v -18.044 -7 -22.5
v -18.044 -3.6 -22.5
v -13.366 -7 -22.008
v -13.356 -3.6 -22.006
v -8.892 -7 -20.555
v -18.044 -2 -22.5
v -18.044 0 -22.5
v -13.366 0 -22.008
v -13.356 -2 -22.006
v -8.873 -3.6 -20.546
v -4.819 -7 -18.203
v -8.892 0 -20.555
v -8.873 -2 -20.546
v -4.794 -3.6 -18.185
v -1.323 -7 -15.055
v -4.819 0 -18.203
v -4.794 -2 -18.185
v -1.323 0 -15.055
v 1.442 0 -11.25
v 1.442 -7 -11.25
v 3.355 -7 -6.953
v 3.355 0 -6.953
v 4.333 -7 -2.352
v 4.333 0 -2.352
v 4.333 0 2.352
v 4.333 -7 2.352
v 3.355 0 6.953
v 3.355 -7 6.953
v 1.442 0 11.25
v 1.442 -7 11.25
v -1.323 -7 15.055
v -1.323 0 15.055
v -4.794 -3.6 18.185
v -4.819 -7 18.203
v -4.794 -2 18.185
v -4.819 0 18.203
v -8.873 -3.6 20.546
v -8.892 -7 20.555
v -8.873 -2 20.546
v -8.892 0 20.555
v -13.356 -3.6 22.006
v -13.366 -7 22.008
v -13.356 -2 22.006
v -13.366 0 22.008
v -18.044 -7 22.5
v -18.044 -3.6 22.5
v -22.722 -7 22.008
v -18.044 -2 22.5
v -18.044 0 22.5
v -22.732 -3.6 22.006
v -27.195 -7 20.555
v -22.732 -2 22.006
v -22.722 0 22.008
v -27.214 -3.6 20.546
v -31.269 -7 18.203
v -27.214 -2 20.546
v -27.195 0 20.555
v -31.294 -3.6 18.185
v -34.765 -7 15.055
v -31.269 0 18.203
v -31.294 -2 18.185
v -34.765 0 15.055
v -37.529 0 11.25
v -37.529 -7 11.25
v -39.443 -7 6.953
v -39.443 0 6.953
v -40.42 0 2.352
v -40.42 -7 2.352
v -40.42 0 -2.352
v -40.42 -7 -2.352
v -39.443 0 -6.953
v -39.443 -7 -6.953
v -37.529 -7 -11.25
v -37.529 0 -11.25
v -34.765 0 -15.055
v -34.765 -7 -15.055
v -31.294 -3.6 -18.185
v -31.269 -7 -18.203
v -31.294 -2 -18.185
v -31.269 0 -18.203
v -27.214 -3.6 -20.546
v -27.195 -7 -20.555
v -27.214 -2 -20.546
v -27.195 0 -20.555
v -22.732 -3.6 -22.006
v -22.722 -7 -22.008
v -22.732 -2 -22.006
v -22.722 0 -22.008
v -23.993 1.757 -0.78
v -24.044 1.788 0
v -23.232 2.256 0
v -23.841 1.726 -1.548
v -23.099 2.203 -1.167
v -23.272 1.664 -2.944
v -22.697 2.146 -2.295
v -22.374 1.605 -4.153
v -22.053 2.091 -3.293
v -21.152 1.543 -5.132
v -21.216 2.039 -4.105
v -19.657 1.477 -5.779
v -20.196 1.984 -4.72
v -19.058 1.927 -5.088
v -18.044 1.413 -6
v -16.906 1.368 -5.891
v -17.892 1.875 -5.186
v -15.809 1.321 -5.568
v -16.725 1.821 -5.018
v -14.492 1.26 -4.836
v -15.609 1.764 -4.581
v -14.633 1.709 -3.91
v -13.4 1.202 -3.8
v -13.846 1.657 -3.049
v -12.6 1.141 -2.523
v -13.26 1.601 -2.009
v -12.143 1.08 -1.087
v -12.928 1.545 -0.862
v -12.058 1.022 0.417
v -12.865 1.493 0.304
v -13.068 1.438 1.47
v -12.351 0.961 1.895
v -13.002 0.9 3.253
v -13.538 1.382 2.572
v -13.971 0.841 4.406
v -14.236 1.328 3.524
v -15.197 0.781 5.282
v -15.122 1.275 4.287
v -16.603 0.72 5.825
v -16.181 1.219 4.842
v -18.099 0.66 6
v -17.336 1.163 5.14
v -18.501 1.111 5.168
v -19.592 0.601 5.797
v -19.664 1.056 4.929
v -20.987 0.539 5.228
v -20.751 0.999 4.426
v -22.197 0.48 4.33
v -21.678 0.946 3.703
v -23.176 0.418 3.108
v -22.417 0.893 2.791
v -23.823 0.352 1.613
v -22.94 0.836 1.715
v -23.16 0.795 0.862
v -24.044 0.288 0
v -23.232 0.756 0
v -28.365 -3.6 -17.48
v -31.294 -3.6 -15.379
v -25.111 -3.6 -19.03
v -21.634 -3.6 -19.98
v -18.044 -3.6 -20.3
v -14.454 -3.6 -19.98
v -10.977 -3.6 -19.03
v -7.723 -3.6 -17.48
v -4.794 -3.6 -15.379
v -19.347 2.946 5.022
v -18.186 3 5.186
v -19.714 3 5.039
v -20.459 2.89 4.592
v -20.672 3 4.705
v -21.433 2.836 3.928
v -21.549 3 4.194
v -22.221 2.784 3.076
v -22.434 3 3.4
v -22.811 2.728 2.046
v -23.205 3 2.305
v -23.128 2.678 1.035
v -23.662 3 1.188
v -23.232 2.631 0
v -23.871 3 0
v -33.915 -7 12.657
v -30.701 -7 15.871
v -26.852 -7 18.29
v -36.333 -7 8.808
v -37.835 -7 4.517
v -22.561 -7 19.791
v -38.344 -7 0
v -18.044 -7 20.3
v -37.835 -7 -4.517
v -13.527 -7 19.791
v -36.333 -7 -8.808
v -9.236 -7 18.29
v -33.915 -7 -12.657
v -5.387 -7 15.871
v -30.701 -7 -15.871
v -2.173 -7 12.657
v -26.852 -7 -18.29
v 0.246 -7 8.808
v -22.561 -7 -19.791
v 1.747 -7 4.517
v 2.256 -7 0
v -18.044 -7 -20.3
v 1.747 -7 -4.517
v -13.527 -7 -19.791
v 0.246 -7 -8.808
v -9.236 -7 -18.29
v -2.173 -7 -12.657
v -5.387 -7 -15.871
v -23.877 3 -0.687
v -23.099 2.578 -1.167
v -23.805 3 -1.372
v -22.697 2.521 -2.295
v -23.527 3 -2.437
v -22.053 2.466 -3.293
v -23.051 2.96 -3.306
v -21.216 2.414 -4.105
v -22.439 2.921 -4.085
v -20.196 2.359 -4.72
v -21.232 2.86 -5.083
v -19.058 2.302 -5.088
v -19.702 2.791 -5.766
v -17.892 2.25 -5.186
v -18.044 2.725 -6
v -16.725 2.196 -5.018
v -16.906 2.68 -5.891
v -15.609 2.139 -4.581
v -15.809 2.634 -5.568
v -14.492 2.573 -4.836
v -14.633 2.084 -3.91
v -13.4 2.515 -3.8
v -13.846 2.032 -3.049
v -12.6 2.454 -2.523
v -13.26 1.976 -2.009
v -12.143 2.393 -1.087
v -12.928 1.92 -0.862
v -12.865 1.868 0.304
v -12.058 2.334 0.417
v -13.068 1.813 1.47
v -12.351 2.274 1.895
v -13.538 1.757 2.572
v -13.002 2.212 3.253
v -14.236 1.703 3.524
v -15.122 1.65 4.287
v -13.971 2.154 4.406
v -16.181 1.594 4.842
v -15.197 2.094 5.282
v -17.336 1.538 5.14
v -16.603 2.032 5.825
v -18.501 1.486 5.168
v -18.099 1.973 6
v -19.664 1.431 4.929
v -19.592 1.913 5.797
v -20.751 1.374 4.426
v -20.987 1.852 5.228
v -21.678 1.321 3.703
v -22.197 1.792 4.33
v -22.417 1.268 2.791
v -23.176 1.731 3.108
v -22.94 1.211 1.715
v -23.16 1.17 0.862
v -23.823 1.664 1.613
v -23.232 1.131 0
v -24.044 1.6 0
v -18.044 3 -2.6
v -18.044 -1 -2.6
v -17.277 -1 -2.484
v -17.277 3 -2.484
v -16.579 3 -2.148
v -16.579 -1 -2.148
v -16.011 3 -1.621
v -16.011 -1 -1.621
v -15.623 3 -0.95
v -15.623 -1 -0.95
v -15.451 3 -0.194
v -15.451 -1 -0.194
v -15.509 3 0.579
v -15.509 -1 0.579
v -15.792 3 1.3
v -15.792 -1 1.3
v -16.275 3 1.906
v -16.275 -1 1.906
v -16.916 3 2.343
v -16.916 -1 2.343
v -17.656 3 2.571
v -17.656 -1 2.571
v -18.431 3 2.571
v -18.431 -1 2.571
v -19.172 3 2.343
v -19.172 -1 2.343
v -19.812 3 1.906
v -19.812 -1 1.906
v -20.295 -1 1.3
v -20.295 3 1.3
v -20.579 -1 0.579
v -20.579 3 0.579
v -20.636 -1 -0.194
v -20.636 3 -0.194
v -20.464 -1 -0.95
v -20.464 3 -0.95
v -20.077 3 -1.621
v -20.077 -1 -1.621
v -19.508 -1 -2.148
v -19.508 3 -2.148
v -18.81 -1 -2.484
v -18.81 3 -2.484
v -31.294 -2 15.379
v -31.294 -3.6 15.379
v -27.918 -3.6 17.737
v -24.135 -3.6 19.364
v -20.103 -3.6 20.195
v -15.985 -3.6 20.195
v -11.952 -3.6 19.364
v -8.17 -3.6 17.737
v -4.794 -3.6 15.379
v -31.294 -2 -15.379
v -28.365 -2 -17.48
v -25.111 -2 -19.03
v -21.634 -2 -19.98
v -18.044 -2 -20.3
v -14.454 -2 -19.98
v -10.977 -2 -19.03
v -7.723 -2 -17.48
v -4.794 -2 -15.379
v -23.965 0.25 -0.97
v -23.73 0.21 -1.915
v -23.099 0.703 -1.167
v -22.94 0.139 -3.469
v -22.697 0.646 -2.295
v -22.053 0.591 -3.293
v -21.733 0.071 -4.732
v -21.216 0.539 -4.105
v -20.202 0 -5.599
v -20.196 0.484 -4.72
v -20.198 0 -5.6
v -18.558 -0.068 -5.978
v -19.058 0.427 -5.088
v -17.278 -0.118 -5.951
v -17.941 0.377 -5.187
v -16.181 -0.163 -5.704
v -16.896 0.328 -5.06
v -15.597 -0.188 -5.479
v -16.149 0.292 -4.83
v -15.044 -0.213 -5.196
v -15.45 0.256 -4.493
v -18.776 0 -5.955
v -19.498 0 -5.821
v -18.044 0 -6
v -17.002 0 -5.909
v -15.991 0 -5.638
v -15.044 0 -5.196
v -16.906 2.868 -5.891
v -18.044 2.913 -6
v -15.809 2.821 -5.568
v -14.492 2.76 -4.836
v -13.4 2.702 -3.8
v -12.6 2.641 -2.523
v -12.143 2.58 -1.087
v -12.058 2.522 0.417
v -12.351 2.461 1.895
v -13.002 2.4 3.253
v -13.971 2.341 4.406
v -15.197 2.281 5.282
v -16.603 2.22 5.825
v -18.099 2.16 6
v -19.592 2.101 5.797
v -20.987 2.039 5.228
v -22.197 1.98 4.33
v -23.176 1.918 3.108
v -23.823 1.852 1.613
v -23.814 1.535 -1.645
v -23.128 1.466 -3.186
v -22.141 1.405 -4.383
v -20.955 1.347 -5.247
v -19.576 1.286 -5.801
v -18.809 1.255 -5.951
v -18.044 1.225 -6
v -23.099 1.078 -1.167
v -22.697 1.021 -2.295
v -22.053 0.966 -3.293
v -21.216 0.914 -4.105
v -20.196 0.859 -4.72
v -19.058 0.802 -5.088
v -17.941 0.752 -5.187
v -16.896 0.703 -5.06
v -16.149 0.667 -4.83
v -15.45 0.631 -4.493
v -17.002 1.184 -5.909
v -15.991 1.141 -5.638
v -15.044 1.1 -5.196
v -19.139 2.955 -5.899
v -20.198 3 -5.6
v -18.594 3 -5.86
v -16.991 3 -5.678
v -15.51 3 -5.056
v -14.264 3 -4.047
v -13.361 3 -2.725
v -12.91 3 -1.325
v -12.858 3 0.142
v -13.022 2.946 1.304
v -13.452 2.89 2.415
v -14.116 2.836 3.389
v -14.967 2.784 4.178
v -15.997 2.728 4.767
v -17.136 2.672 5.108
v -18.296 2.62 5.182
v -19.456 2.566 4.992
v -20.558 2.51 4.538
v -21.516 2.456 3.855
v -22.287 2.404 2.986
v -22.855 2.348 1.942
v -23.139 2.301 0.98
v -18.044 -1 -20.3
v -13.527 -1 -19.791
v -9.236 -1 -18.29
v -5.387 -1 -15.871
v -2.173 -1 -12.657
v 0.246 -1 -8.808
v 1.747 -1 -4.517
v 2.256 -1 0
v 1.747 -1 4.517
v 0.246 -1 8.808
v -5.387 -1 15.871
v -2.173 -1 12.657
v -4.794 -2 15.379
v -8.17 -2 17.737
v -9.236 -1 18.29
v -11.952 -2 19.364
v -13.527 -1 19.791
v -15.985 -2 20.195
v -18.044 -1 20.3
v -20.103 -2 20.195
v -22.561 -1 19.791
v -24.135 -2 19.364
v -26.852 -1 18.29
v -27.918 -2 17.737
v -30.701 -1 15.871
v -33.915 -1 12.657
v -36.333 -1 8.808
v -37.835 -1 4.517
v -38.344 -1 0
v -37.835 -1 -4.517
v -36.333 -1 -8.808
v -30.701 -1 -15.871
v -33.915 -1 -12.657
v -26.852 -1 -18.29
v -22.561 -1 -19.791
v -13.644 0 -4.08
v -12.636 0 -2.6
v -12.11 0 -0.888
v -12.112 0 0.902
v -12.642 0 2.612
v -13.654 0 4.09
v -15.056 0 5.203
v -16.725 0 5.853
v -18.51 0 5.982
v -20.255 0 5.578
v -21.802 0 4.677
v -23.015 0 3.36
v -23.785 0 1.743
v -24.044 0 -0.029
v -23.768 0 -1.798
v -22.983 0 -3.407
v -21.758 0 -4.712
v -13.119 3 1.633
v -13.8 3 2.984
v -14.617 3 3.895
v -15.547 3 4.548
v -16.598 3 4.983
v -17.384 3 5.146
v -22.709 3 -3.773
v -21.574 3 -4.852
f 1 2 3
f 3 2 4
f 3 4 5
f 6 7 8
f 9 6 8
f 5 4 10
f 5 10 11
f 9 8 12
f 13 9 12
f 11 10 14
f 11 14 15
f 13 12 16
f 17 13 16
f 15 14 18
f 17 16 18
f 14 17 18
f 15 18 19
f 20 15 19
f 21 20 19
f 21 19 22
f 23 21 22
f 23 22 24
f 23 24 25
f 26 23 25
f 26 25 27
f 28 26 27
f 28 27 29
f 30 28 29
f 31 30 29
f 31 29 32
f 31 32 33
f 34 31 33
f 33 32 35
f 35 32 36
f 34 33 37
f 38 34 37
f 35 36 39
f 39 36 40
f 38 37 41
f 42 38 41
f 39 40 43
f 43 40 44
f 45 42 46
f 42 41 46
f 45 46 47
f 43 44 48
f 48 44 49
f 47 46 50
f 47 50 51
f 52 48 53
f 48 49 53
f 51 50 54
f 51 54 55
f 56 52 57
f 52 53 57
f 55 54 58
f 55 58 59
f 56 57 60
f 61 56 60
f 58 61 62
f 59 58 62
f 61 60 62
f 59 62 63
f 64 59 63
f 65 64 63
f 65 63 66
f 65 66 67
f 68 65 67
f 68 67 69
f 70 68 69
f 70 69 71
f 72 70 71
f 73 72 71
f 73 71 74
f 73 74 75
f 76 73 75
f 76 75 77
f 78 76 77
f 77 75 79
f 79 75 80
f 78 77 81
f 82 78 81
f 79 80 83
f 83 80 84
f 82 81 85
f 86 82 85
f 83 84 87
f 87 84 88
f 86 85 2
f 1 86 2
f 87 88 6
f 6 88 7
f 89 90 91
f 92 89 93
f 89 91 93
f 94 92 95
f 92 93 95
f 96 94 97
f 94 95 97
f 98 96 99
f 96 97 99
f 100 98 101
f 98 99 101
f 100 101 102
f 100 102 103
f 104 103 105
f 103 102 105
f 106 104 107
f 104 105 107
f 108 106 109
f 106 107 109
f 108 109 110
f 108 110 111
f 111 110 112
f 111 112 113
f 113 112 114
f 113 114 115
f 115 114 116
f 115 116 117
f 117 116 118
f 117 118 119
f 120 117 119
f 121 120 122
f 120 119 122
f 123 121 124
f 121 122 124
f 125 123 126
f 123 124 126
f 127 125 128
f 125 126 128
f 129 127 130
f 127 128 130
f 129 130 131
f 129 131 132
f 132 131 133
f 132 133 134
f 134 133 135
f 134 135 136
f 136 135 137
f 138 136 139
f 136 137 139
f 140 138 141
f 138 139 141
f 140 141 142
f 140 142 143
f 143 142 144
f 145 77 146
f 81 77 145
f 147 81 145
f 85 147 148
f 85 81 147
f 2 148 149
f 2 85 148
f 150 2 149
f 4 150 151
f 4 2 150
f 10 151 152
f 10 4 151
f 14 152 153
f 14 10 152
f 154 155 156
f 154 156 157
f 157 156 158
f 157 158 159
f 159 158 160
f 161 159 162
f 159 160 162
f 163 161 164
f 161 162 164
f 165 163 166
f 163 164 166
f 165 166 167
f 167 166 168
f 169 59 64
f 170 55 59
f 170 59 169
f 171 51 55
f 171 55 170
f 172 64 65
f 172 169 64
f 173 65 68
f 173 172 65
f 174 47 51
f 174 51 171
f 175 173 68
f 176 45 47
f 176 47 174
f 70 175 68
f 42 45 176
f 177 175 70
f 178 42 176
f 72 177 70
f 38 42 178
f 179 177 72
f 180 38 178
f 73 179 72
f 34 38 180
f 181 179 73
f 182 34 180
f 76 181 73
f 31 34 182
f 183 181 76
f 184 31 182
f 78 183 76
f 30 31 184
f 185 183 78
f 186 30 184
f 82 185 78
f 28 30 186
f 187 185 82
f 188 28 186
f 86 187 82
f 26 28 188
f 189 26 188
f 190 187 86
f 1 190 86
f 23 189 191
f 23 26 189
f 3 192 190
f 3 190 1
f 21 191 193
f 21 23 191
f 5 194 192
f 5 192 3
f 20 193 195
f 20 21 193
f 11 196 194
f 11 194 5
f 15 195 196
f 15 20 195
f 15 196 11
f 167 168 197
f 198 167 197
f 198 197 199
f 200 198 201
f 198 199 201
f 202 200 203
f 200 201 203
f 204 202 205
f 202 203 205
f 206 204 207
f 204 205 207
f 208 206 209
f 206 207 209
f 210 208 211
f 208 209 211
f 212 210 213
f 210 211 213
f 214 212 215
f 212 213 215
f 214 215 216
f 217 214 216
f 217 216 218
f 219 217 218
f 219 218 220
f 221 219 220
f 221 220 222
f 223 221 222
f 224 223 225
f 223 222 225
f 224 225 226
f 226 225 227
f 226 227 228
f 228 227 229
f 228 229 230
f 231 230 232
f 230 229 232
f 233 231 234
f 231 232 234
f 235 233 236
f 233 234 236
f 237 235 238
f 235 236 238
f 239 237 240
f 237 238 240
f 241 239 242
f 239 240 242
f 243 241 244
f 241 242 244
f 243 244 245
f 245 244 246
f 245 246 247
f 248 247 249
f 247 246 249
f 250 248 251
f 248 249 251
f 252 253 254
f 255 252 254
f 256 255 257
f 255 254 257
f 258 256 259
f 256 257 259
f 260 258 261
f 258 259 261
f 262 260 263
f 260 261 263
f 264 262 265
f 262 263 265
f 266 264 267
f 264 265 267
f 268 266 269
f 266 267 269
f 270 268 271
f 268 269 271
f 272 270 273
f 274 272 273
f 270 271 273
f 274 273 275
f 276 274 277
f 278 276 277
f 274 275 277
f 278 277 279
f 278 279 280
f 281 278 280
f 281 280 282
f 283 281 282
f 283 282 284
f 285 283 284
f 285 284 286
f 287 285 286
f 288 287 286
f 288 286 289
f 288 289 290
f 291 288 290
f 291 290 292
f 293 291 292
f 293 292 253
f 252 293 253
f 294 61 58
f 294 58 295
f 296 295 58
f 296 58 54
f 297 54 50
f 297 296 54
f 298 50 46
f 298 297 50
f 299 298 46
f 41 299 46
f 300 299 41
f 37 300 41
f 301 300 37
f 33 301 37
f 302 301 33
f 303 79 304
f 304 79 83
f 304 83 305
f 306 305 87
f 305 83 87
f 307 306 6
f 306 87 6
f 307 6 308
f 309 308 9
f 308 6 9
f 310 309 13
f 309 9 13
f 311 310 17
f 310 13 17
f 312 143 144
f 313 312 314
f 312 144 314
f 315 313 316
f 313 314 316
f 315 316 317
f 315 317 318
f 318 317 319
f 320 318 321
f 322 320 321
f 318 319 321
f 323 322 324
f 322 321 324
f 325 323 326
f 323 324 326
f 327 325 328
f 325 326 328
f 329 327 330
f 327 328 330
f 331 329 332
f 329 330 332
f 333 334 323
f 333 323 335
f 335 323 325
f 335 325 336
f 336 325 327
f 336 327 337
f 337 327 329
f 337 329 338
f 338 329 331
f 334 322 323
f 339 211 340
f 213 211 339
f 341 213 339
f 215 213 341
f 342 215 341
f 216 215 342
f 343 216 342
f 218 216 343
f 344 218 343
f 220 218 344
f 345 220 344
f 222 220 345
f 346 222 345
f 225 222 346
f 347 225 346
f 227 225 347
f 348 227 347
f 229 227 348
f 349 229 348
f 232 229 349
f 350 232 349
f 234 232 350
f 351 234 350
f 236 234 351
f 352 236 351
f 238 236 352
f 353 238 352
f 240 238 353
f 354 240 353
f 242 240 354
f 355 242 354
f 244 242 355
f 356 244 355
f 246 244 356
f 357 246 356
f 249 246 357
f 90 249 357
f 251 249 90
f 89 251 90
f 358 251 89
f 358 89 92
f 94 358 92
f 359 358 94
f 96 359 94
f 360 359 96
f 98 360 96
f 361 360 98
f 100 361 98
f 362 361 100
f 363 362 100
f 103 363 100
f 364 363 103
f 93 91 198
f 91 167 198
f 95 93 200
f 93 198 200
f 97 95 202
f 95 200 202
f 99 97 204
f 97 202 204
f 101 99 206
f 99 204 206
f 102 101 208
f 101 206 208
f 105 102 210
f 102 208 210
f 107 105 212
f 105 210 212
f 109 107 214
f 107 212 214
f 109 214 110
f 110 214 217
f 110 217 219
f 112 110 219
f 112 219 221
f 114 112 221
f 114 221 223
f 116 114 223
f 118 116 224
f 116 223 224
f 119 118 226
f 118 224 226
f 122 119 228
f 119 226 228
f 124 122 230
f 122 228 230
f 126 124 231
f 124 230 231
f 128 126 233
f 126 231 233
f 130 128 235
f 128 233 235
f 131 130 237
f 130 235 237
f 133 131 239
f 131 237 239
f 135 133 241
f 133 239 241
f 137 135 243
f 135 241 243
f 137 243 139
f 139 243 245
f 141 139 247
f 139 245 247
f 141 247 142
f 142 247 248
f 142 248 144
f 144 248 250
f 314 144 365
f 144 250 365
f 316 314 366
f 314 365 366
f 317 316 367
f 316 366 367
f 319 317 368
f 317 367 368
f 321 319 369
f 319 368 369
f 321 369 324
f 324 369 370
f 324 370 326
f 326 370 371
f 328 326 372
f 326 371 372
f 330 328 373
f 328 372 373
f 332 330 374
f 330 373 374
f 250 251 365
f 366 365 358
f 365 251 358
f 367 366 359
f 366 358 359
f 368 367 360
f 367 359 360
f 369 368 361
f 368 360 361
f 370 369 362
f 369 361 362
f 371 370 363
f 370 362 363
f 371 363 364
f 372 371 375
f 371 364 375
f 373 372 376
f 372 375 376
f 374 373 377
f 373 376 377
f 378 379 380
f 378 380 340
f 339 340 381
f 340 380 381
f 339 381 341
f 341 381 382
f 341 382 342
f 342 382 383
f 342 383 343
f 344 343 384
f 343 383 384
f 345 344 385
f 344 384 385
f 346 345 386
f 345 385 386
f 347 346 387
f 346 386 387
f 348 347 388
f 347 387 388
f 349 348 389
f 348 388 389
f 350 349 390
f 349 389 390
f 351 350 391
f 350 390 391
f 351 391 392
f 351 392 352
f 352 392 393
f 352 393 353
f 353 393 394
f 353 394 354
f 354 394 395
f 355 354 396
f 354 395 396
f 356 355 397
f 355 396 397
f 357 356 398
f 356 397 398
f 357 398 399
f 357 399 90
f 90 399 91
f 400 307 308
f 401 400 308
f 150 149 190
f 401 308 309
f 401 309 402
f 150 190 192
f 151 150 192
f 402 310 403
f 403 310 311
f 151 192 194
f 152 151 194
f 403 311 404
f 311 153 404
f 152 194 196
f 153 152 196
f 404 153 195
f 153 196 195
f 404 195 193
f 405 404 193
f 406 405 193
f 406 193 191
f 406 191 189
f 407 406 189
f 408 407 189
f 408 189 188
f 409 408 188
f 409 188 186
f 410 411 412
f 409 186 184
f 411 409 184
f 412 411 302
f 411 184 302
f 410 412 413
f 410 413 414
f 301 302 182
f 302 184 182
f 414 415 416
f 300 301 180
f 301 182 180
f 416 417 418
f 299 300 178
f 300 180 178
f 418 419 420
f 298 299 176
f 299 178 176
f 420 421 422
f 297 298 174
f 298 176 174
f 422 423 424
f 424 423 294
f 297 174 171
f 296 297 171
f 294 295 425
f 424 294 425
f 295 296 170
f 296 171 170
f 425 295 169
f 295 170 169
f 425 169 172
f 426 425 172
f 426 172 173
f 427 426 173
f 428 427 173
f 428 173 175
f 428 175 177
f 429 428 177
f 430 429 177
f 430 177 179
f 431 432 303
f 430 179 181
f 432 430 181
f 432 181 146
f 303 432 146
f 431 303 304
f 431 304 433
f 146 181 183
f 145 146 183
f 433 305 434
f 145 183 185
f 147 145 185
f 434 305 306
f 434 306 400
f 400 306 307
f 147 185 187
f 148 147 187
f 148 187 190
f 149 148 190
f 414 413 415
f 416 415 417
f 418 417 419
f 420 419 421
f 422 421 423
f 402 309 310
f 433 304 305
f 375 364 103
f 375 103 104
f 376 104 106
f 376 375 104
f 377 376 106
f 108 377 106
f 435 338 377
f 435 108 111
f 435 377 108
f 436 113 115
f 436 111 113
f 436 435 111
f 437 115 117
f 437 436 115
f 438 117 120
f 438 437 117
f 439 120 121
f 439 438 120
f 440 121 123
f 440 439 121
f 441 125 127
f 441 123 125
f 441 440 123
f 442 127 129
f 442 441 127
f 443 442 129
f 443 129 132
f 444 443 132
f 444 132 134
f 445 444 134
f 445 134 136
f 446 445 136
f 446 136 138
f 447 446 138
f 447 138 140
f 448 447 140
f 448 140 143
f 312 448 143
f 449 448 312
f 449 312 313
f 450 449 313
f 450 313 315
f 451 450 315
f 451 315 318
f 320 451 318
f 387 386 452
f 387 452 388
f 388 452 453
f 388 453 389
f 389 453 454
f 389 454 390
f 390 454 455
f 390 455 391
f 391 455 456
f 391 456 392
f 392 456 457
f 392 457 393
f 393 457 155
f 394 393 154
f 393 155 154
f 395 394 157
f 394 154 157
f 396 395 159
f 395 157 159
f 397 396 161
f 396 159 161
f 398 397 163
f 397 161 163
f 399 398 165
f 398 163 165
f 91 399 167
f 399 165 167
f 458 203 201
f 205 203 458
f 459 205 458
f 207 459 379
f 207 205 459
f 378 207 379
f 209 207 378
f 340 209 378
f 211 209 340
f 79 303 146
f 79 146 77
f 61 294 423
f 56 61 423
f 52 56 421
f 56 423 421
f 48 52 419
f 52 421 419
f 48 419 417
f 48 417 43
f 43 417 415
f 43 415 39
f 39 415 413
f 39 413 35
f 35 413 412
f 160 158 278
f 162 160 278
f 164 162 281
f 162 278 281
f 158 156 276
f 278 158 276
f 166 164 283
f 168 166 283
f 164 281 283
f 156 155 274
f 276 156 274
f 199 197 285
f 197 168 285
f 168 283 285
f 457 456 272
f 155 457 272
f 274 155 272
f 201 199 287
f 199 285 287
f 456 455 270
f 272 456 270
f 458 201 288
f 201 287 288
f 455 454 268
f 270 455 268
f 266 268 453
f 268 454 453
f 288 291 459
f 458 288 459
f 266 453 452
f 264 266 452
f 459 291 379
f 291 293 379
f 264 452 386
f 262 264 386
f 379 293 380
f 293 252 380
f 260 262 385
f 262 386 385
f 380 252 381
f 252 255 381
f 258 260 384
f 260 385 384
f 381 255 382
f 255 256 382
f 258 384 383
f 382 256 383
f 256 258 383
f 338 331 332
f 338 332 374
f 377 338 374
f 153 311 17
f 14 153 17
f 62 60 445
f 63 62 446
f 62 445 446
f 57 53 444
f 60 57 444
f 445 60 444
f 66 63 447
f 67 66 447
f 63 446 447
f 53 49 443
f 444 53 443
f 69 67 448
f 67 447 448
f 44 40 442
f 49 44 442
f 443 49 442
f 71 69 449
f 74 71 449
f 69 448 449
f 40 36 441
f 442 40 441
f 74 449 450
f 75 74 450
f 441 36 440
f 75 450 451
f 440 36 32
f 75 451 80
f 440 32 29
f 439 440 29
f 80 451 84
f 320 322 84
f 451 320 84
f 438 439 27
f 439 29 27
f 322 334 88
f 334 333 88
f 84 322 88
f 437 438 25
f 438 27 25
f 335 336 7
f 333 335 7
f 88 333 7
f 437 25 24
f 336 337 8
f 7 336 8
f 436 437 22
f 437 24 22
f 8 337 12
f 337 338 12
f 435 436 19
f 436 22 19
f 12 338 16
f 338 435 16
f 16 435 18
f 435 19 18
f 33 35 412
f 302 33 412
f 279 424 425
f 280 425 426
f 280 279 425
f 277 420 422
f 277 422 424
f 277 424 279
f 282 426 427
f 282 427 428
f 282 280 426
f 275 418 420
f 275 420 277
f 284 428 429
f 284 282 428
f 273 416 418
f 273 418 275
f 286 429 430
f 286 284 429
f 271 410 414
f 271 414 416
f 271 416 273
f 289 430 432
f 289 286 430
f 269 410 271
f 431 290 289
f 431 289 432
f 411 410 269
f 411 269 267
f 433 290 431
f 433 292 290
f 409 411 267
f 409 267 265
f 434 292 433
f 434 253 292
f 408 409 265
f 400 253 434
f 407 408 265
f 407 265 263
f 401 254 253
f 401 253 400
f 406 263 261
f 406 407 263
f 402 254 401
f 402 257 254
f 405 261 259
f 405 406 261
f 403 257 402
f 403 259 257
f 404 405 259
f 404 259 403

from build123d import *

# Parameters (mm, degrees)
SKIZZE1_R                            = 5
ZYLINDER_DEPTH                       = 2.2
SCHNITT_LINEAR_AUSTRAGEN1_DEPTH      = 10
SCHNITT_LINEAR_AUSTRAGEN1_DEPTH_BACK = 5
SKIZZE4_R                            = 4.5
SKIZZE6_R                            = 22.5
FASSUNG_OBJEKTTR_GERGEWINDE_DEPTH    = 7
SKIZZE11_R                           = 20.3
BOHRUNG_F_R_INNENGEWINDE_DEPTH       = 6
SKIZZE13_R                           = 6
AUFSATZ_LINEAR_AUSTRAGEN1_DEPTH      = 3
SKIZZE16_R                           = 2.6
SCHNITT_LINEAR_AUSTRAGEN13_DEPTH     = 10
GEWINDE1_PITCH                       = 1.5
SKIZZE17_W                           = 26.5
SKIZZE17_H                           = 49.541135346
SCHNITT_LINEAR_AUSTRAGEN14_DEPTH     = 1.6


with BuildPart() as part:
    # Skizze1 → Zylinder (new body)
    with BuildSketch(Plane(origin=(0, 0, 0), x_dir=(1, 0, 0), z_dir=(0, 1, 0))):
        with Locations(Location((-18.043745097, 0, 0), (0, 0, 270))):
            Circle(SKIZZE1_R)
    extrude(amount=ZYLINDER_DEPTH)

    # Skizze4 → Schnitt-Linear austragen1 (cut, two sides: drawn at the far end of the back side and taken through both)
    with BuildSketch(Plane(origin=(0, 2.2, 0), x_dir=(1, 0, 0), z_dir=(0, 1, 0)).offset(-SCHNITT_LINEAR_AUSTRAGEN1_DEPTH_BACK)):
        with Locations(Location((-18.043745097, 0, 0), (0, 0, 270))):
            Circle(SKIZZE4_R)
    extrude(amount=SCHNITT_LINEAR_AUSTRAGEN1_DEPTH + SCHNITT_LINEAR_AUSTRAGEN1_DEPTH_BACK, mode=Mode.SUBTRACT)

    # Skizze6 → Fassung Objektträgergewinde (add)
    with BuildSketch(Plane(origin=(0, 0, 0), x_dir=(-1, 0, 0), z_dir=(0, -1, 0))):
        with Locations(Location((18.043745097, 0, 0), (0, 0, 90))):
            Circle(SKIZZE6_R)
    extrude(amount=FASSUNG_OBJEKTTR_GERGEWINDE_DEPTH)

    # Skizze11 → Bohrung für Innengewinde (cut)
    with BuildSketch(Plane(origin=(0, -7, 0), x_dir=(-1, 0, 0), z_dir=(0, -1, 0))):
        with Locations(Location((18.043745097, 0, 0), (0, 0, 90))):
            Circle(SKIZZE11_R)
    extrude(amount=-BOHRUNG_F_R_INNENGEWINDE_DEPTH, mode=Mode.SUBTRACT)

    # Skizze13 → Aufsatz-Linear austragen1 (add)
    with BuildSketch(Plane(origin=(0, 0, 0), x_dir=(-1, 0, 0), z_dir=(0, -1, 0))):
        with Locations(Location((18.043745097, 0, 0), (0, 0, 90))):
            Circle(SKIZZE13_R)
    extrude(amount=-AUFSATZ_LINEAR_AUSTRAGEN1_DEPTH)

    # Skizze16 → Schnitt-Linear austragen13 (cut)
    with BuildSketch(Plane(origin=(0, -7, 0), x_dir=(-1, 0, 0), z_dir=(0, -1, 0))):
        with Locations(Location((18.043745097, 0, 0), (0, 0, 90))):
            Circle(SKIZZE16_R)
    extrude(amount=-SCHNITT_LINEAR_AUSTRAGEN13_DEPTH, mode=Mode.SUBTRACT)

    # Gewinde1: the profile of Gewindeprofil1 profile screwed along a right-hand helix of 2.333333 turns, 8 arcs to a turn; built about Z, then put on its axis
    gewinde1_z = Axis((0, 0, 0), (0, 0, 1))
    gewinde1_corners = [(6.0003, 0, -0.000173205), (6.0003, 0, 1.312673201), (5.188101187, 0, 0.843749998), (5.188101187, 0, 0.468749998)]
    with BuildLine(mode=Mode.PRIVATE) as gewinde1_profile:
        Line(gewinde1_corners[0], gewinde1_corners[1])
        Line(gewinde1_corners[1], gewinde1_corners[2])
        Line(gewinde1_corners[2], gewinde1_corners[3])
        Line(gewinde1_corners[3], gewinde1_corners[0])
    gewinde1_cap = Face(gewinde1_profile.wire())
    gewinde1_turn_angles = [0, 22.5, 45, 67.5, 90, 112.5, 135, 157.5, 180, 202.5, 225, 247.5, 270, 292.5, 315, 337.5, 360]
    gewinde1_turn_weights = [1, 0.9238795325112867, 1, 0.9238795325112867, 1, 0.9238795325112867, 1, 0.9238795325112867, 1, 0.9238795325112867, 1, 0.9238795325112867, 1, 0.9238795325112867, 1, 0.9238795325112867, 1]
    gewinde1_turn_rails = [Edge.make_bspline([Vector(p[0], p[1], 0).rotate(gewinde1_z, gewinde1_turn_angles[k]) / gewinde1_turn_weights[k] + Vector(0, 0, p[2] + GEWINDE1_PITCH * gewinde1_turn_angles[k] / 360) for k in range(17)], [0, 0, 0, 1, 1, 2, 2, 3, 3, 4, 4, 5, 5, 6, 6, 7, 7, 8, 8, 8], 2, gewinde1_turn_weights) for p in gewinde1_corners]
    gewinde1_turn_sides = [Face.make_surface_from_curves(gewinde1_turn_rails[p[0]], gewinde1_turn_rails[p[1]]) for p in [(0, 1), (1, 2), (2, 3), (3, 0)]]
    gewinde1_last_angles = [720, 742.5, 765, 787.5, 810, 825, 840]
    gewinde1_last_weights = [1, 0.9238795325112867, 1, 0.9238795325112867, 1, 0.9659258262890685, 1]
    gewinde1_last_rails = [Edge.make_bspline([Vector(p[0], p[1], 0).rotate(gewinde1_z, gewinde1_last_angles[k]) / gewinde1_last_weights[k] + Vector(0, 0, p[2] + GEWINDE1_PITCH * gewinde1_last_angles[k] / 360) for k in range(7)], [0, 0, 0, 1, 1, 2, 2, 3, 3, 3], 2, gewinde1_last_weights) for p in gewinde1_corners]
    gewinde1_last_sides = [Face.make_surface_from_curves(gewinde1_last_rails[p[0]], gewinde1_last_rails[p[1]]) for p in [(0, 1), (1, 2), (2, 3), (3, 0)]]
    gewinde1 = Plane(origin=(-18.043745097, 4.6, 0), x_dir=(-1, 0, 0), z_dir=(0, -1, 0)) * Solid(Shell([*[p.moved(Location((0, 0, GEWINDE1_PITCH * i))) for i in range(2) for p in gewinde1_turn_sides], *gewinde1_last_sides, gewinde1_cap, gewinde1_cap.rotate(gewinde1_z, 840).moved(Location((0, 0, GEWINDE1_PITCH * 840 / 360)))]))
    add(gewinde1, mode=Mode.SUBTRACT)

    # Skizze17 → Schnitt-Linear austragen14 (cut)
    with BuildSketch(Plane(origin=(0, -2, 0), x_dir=(1, 0, 0), z_dir=(0, 1, 0))):
        with Locations((-18.043745097, 0)):
            Rectangle(SKIZZE17_W, SKIZZE17_H)
    extrude(amount=-SCHNITT_LINEAR_AUSTRAGEN14_DEPTH, mode=Mode.SUBTRACT)


solid = part.part
